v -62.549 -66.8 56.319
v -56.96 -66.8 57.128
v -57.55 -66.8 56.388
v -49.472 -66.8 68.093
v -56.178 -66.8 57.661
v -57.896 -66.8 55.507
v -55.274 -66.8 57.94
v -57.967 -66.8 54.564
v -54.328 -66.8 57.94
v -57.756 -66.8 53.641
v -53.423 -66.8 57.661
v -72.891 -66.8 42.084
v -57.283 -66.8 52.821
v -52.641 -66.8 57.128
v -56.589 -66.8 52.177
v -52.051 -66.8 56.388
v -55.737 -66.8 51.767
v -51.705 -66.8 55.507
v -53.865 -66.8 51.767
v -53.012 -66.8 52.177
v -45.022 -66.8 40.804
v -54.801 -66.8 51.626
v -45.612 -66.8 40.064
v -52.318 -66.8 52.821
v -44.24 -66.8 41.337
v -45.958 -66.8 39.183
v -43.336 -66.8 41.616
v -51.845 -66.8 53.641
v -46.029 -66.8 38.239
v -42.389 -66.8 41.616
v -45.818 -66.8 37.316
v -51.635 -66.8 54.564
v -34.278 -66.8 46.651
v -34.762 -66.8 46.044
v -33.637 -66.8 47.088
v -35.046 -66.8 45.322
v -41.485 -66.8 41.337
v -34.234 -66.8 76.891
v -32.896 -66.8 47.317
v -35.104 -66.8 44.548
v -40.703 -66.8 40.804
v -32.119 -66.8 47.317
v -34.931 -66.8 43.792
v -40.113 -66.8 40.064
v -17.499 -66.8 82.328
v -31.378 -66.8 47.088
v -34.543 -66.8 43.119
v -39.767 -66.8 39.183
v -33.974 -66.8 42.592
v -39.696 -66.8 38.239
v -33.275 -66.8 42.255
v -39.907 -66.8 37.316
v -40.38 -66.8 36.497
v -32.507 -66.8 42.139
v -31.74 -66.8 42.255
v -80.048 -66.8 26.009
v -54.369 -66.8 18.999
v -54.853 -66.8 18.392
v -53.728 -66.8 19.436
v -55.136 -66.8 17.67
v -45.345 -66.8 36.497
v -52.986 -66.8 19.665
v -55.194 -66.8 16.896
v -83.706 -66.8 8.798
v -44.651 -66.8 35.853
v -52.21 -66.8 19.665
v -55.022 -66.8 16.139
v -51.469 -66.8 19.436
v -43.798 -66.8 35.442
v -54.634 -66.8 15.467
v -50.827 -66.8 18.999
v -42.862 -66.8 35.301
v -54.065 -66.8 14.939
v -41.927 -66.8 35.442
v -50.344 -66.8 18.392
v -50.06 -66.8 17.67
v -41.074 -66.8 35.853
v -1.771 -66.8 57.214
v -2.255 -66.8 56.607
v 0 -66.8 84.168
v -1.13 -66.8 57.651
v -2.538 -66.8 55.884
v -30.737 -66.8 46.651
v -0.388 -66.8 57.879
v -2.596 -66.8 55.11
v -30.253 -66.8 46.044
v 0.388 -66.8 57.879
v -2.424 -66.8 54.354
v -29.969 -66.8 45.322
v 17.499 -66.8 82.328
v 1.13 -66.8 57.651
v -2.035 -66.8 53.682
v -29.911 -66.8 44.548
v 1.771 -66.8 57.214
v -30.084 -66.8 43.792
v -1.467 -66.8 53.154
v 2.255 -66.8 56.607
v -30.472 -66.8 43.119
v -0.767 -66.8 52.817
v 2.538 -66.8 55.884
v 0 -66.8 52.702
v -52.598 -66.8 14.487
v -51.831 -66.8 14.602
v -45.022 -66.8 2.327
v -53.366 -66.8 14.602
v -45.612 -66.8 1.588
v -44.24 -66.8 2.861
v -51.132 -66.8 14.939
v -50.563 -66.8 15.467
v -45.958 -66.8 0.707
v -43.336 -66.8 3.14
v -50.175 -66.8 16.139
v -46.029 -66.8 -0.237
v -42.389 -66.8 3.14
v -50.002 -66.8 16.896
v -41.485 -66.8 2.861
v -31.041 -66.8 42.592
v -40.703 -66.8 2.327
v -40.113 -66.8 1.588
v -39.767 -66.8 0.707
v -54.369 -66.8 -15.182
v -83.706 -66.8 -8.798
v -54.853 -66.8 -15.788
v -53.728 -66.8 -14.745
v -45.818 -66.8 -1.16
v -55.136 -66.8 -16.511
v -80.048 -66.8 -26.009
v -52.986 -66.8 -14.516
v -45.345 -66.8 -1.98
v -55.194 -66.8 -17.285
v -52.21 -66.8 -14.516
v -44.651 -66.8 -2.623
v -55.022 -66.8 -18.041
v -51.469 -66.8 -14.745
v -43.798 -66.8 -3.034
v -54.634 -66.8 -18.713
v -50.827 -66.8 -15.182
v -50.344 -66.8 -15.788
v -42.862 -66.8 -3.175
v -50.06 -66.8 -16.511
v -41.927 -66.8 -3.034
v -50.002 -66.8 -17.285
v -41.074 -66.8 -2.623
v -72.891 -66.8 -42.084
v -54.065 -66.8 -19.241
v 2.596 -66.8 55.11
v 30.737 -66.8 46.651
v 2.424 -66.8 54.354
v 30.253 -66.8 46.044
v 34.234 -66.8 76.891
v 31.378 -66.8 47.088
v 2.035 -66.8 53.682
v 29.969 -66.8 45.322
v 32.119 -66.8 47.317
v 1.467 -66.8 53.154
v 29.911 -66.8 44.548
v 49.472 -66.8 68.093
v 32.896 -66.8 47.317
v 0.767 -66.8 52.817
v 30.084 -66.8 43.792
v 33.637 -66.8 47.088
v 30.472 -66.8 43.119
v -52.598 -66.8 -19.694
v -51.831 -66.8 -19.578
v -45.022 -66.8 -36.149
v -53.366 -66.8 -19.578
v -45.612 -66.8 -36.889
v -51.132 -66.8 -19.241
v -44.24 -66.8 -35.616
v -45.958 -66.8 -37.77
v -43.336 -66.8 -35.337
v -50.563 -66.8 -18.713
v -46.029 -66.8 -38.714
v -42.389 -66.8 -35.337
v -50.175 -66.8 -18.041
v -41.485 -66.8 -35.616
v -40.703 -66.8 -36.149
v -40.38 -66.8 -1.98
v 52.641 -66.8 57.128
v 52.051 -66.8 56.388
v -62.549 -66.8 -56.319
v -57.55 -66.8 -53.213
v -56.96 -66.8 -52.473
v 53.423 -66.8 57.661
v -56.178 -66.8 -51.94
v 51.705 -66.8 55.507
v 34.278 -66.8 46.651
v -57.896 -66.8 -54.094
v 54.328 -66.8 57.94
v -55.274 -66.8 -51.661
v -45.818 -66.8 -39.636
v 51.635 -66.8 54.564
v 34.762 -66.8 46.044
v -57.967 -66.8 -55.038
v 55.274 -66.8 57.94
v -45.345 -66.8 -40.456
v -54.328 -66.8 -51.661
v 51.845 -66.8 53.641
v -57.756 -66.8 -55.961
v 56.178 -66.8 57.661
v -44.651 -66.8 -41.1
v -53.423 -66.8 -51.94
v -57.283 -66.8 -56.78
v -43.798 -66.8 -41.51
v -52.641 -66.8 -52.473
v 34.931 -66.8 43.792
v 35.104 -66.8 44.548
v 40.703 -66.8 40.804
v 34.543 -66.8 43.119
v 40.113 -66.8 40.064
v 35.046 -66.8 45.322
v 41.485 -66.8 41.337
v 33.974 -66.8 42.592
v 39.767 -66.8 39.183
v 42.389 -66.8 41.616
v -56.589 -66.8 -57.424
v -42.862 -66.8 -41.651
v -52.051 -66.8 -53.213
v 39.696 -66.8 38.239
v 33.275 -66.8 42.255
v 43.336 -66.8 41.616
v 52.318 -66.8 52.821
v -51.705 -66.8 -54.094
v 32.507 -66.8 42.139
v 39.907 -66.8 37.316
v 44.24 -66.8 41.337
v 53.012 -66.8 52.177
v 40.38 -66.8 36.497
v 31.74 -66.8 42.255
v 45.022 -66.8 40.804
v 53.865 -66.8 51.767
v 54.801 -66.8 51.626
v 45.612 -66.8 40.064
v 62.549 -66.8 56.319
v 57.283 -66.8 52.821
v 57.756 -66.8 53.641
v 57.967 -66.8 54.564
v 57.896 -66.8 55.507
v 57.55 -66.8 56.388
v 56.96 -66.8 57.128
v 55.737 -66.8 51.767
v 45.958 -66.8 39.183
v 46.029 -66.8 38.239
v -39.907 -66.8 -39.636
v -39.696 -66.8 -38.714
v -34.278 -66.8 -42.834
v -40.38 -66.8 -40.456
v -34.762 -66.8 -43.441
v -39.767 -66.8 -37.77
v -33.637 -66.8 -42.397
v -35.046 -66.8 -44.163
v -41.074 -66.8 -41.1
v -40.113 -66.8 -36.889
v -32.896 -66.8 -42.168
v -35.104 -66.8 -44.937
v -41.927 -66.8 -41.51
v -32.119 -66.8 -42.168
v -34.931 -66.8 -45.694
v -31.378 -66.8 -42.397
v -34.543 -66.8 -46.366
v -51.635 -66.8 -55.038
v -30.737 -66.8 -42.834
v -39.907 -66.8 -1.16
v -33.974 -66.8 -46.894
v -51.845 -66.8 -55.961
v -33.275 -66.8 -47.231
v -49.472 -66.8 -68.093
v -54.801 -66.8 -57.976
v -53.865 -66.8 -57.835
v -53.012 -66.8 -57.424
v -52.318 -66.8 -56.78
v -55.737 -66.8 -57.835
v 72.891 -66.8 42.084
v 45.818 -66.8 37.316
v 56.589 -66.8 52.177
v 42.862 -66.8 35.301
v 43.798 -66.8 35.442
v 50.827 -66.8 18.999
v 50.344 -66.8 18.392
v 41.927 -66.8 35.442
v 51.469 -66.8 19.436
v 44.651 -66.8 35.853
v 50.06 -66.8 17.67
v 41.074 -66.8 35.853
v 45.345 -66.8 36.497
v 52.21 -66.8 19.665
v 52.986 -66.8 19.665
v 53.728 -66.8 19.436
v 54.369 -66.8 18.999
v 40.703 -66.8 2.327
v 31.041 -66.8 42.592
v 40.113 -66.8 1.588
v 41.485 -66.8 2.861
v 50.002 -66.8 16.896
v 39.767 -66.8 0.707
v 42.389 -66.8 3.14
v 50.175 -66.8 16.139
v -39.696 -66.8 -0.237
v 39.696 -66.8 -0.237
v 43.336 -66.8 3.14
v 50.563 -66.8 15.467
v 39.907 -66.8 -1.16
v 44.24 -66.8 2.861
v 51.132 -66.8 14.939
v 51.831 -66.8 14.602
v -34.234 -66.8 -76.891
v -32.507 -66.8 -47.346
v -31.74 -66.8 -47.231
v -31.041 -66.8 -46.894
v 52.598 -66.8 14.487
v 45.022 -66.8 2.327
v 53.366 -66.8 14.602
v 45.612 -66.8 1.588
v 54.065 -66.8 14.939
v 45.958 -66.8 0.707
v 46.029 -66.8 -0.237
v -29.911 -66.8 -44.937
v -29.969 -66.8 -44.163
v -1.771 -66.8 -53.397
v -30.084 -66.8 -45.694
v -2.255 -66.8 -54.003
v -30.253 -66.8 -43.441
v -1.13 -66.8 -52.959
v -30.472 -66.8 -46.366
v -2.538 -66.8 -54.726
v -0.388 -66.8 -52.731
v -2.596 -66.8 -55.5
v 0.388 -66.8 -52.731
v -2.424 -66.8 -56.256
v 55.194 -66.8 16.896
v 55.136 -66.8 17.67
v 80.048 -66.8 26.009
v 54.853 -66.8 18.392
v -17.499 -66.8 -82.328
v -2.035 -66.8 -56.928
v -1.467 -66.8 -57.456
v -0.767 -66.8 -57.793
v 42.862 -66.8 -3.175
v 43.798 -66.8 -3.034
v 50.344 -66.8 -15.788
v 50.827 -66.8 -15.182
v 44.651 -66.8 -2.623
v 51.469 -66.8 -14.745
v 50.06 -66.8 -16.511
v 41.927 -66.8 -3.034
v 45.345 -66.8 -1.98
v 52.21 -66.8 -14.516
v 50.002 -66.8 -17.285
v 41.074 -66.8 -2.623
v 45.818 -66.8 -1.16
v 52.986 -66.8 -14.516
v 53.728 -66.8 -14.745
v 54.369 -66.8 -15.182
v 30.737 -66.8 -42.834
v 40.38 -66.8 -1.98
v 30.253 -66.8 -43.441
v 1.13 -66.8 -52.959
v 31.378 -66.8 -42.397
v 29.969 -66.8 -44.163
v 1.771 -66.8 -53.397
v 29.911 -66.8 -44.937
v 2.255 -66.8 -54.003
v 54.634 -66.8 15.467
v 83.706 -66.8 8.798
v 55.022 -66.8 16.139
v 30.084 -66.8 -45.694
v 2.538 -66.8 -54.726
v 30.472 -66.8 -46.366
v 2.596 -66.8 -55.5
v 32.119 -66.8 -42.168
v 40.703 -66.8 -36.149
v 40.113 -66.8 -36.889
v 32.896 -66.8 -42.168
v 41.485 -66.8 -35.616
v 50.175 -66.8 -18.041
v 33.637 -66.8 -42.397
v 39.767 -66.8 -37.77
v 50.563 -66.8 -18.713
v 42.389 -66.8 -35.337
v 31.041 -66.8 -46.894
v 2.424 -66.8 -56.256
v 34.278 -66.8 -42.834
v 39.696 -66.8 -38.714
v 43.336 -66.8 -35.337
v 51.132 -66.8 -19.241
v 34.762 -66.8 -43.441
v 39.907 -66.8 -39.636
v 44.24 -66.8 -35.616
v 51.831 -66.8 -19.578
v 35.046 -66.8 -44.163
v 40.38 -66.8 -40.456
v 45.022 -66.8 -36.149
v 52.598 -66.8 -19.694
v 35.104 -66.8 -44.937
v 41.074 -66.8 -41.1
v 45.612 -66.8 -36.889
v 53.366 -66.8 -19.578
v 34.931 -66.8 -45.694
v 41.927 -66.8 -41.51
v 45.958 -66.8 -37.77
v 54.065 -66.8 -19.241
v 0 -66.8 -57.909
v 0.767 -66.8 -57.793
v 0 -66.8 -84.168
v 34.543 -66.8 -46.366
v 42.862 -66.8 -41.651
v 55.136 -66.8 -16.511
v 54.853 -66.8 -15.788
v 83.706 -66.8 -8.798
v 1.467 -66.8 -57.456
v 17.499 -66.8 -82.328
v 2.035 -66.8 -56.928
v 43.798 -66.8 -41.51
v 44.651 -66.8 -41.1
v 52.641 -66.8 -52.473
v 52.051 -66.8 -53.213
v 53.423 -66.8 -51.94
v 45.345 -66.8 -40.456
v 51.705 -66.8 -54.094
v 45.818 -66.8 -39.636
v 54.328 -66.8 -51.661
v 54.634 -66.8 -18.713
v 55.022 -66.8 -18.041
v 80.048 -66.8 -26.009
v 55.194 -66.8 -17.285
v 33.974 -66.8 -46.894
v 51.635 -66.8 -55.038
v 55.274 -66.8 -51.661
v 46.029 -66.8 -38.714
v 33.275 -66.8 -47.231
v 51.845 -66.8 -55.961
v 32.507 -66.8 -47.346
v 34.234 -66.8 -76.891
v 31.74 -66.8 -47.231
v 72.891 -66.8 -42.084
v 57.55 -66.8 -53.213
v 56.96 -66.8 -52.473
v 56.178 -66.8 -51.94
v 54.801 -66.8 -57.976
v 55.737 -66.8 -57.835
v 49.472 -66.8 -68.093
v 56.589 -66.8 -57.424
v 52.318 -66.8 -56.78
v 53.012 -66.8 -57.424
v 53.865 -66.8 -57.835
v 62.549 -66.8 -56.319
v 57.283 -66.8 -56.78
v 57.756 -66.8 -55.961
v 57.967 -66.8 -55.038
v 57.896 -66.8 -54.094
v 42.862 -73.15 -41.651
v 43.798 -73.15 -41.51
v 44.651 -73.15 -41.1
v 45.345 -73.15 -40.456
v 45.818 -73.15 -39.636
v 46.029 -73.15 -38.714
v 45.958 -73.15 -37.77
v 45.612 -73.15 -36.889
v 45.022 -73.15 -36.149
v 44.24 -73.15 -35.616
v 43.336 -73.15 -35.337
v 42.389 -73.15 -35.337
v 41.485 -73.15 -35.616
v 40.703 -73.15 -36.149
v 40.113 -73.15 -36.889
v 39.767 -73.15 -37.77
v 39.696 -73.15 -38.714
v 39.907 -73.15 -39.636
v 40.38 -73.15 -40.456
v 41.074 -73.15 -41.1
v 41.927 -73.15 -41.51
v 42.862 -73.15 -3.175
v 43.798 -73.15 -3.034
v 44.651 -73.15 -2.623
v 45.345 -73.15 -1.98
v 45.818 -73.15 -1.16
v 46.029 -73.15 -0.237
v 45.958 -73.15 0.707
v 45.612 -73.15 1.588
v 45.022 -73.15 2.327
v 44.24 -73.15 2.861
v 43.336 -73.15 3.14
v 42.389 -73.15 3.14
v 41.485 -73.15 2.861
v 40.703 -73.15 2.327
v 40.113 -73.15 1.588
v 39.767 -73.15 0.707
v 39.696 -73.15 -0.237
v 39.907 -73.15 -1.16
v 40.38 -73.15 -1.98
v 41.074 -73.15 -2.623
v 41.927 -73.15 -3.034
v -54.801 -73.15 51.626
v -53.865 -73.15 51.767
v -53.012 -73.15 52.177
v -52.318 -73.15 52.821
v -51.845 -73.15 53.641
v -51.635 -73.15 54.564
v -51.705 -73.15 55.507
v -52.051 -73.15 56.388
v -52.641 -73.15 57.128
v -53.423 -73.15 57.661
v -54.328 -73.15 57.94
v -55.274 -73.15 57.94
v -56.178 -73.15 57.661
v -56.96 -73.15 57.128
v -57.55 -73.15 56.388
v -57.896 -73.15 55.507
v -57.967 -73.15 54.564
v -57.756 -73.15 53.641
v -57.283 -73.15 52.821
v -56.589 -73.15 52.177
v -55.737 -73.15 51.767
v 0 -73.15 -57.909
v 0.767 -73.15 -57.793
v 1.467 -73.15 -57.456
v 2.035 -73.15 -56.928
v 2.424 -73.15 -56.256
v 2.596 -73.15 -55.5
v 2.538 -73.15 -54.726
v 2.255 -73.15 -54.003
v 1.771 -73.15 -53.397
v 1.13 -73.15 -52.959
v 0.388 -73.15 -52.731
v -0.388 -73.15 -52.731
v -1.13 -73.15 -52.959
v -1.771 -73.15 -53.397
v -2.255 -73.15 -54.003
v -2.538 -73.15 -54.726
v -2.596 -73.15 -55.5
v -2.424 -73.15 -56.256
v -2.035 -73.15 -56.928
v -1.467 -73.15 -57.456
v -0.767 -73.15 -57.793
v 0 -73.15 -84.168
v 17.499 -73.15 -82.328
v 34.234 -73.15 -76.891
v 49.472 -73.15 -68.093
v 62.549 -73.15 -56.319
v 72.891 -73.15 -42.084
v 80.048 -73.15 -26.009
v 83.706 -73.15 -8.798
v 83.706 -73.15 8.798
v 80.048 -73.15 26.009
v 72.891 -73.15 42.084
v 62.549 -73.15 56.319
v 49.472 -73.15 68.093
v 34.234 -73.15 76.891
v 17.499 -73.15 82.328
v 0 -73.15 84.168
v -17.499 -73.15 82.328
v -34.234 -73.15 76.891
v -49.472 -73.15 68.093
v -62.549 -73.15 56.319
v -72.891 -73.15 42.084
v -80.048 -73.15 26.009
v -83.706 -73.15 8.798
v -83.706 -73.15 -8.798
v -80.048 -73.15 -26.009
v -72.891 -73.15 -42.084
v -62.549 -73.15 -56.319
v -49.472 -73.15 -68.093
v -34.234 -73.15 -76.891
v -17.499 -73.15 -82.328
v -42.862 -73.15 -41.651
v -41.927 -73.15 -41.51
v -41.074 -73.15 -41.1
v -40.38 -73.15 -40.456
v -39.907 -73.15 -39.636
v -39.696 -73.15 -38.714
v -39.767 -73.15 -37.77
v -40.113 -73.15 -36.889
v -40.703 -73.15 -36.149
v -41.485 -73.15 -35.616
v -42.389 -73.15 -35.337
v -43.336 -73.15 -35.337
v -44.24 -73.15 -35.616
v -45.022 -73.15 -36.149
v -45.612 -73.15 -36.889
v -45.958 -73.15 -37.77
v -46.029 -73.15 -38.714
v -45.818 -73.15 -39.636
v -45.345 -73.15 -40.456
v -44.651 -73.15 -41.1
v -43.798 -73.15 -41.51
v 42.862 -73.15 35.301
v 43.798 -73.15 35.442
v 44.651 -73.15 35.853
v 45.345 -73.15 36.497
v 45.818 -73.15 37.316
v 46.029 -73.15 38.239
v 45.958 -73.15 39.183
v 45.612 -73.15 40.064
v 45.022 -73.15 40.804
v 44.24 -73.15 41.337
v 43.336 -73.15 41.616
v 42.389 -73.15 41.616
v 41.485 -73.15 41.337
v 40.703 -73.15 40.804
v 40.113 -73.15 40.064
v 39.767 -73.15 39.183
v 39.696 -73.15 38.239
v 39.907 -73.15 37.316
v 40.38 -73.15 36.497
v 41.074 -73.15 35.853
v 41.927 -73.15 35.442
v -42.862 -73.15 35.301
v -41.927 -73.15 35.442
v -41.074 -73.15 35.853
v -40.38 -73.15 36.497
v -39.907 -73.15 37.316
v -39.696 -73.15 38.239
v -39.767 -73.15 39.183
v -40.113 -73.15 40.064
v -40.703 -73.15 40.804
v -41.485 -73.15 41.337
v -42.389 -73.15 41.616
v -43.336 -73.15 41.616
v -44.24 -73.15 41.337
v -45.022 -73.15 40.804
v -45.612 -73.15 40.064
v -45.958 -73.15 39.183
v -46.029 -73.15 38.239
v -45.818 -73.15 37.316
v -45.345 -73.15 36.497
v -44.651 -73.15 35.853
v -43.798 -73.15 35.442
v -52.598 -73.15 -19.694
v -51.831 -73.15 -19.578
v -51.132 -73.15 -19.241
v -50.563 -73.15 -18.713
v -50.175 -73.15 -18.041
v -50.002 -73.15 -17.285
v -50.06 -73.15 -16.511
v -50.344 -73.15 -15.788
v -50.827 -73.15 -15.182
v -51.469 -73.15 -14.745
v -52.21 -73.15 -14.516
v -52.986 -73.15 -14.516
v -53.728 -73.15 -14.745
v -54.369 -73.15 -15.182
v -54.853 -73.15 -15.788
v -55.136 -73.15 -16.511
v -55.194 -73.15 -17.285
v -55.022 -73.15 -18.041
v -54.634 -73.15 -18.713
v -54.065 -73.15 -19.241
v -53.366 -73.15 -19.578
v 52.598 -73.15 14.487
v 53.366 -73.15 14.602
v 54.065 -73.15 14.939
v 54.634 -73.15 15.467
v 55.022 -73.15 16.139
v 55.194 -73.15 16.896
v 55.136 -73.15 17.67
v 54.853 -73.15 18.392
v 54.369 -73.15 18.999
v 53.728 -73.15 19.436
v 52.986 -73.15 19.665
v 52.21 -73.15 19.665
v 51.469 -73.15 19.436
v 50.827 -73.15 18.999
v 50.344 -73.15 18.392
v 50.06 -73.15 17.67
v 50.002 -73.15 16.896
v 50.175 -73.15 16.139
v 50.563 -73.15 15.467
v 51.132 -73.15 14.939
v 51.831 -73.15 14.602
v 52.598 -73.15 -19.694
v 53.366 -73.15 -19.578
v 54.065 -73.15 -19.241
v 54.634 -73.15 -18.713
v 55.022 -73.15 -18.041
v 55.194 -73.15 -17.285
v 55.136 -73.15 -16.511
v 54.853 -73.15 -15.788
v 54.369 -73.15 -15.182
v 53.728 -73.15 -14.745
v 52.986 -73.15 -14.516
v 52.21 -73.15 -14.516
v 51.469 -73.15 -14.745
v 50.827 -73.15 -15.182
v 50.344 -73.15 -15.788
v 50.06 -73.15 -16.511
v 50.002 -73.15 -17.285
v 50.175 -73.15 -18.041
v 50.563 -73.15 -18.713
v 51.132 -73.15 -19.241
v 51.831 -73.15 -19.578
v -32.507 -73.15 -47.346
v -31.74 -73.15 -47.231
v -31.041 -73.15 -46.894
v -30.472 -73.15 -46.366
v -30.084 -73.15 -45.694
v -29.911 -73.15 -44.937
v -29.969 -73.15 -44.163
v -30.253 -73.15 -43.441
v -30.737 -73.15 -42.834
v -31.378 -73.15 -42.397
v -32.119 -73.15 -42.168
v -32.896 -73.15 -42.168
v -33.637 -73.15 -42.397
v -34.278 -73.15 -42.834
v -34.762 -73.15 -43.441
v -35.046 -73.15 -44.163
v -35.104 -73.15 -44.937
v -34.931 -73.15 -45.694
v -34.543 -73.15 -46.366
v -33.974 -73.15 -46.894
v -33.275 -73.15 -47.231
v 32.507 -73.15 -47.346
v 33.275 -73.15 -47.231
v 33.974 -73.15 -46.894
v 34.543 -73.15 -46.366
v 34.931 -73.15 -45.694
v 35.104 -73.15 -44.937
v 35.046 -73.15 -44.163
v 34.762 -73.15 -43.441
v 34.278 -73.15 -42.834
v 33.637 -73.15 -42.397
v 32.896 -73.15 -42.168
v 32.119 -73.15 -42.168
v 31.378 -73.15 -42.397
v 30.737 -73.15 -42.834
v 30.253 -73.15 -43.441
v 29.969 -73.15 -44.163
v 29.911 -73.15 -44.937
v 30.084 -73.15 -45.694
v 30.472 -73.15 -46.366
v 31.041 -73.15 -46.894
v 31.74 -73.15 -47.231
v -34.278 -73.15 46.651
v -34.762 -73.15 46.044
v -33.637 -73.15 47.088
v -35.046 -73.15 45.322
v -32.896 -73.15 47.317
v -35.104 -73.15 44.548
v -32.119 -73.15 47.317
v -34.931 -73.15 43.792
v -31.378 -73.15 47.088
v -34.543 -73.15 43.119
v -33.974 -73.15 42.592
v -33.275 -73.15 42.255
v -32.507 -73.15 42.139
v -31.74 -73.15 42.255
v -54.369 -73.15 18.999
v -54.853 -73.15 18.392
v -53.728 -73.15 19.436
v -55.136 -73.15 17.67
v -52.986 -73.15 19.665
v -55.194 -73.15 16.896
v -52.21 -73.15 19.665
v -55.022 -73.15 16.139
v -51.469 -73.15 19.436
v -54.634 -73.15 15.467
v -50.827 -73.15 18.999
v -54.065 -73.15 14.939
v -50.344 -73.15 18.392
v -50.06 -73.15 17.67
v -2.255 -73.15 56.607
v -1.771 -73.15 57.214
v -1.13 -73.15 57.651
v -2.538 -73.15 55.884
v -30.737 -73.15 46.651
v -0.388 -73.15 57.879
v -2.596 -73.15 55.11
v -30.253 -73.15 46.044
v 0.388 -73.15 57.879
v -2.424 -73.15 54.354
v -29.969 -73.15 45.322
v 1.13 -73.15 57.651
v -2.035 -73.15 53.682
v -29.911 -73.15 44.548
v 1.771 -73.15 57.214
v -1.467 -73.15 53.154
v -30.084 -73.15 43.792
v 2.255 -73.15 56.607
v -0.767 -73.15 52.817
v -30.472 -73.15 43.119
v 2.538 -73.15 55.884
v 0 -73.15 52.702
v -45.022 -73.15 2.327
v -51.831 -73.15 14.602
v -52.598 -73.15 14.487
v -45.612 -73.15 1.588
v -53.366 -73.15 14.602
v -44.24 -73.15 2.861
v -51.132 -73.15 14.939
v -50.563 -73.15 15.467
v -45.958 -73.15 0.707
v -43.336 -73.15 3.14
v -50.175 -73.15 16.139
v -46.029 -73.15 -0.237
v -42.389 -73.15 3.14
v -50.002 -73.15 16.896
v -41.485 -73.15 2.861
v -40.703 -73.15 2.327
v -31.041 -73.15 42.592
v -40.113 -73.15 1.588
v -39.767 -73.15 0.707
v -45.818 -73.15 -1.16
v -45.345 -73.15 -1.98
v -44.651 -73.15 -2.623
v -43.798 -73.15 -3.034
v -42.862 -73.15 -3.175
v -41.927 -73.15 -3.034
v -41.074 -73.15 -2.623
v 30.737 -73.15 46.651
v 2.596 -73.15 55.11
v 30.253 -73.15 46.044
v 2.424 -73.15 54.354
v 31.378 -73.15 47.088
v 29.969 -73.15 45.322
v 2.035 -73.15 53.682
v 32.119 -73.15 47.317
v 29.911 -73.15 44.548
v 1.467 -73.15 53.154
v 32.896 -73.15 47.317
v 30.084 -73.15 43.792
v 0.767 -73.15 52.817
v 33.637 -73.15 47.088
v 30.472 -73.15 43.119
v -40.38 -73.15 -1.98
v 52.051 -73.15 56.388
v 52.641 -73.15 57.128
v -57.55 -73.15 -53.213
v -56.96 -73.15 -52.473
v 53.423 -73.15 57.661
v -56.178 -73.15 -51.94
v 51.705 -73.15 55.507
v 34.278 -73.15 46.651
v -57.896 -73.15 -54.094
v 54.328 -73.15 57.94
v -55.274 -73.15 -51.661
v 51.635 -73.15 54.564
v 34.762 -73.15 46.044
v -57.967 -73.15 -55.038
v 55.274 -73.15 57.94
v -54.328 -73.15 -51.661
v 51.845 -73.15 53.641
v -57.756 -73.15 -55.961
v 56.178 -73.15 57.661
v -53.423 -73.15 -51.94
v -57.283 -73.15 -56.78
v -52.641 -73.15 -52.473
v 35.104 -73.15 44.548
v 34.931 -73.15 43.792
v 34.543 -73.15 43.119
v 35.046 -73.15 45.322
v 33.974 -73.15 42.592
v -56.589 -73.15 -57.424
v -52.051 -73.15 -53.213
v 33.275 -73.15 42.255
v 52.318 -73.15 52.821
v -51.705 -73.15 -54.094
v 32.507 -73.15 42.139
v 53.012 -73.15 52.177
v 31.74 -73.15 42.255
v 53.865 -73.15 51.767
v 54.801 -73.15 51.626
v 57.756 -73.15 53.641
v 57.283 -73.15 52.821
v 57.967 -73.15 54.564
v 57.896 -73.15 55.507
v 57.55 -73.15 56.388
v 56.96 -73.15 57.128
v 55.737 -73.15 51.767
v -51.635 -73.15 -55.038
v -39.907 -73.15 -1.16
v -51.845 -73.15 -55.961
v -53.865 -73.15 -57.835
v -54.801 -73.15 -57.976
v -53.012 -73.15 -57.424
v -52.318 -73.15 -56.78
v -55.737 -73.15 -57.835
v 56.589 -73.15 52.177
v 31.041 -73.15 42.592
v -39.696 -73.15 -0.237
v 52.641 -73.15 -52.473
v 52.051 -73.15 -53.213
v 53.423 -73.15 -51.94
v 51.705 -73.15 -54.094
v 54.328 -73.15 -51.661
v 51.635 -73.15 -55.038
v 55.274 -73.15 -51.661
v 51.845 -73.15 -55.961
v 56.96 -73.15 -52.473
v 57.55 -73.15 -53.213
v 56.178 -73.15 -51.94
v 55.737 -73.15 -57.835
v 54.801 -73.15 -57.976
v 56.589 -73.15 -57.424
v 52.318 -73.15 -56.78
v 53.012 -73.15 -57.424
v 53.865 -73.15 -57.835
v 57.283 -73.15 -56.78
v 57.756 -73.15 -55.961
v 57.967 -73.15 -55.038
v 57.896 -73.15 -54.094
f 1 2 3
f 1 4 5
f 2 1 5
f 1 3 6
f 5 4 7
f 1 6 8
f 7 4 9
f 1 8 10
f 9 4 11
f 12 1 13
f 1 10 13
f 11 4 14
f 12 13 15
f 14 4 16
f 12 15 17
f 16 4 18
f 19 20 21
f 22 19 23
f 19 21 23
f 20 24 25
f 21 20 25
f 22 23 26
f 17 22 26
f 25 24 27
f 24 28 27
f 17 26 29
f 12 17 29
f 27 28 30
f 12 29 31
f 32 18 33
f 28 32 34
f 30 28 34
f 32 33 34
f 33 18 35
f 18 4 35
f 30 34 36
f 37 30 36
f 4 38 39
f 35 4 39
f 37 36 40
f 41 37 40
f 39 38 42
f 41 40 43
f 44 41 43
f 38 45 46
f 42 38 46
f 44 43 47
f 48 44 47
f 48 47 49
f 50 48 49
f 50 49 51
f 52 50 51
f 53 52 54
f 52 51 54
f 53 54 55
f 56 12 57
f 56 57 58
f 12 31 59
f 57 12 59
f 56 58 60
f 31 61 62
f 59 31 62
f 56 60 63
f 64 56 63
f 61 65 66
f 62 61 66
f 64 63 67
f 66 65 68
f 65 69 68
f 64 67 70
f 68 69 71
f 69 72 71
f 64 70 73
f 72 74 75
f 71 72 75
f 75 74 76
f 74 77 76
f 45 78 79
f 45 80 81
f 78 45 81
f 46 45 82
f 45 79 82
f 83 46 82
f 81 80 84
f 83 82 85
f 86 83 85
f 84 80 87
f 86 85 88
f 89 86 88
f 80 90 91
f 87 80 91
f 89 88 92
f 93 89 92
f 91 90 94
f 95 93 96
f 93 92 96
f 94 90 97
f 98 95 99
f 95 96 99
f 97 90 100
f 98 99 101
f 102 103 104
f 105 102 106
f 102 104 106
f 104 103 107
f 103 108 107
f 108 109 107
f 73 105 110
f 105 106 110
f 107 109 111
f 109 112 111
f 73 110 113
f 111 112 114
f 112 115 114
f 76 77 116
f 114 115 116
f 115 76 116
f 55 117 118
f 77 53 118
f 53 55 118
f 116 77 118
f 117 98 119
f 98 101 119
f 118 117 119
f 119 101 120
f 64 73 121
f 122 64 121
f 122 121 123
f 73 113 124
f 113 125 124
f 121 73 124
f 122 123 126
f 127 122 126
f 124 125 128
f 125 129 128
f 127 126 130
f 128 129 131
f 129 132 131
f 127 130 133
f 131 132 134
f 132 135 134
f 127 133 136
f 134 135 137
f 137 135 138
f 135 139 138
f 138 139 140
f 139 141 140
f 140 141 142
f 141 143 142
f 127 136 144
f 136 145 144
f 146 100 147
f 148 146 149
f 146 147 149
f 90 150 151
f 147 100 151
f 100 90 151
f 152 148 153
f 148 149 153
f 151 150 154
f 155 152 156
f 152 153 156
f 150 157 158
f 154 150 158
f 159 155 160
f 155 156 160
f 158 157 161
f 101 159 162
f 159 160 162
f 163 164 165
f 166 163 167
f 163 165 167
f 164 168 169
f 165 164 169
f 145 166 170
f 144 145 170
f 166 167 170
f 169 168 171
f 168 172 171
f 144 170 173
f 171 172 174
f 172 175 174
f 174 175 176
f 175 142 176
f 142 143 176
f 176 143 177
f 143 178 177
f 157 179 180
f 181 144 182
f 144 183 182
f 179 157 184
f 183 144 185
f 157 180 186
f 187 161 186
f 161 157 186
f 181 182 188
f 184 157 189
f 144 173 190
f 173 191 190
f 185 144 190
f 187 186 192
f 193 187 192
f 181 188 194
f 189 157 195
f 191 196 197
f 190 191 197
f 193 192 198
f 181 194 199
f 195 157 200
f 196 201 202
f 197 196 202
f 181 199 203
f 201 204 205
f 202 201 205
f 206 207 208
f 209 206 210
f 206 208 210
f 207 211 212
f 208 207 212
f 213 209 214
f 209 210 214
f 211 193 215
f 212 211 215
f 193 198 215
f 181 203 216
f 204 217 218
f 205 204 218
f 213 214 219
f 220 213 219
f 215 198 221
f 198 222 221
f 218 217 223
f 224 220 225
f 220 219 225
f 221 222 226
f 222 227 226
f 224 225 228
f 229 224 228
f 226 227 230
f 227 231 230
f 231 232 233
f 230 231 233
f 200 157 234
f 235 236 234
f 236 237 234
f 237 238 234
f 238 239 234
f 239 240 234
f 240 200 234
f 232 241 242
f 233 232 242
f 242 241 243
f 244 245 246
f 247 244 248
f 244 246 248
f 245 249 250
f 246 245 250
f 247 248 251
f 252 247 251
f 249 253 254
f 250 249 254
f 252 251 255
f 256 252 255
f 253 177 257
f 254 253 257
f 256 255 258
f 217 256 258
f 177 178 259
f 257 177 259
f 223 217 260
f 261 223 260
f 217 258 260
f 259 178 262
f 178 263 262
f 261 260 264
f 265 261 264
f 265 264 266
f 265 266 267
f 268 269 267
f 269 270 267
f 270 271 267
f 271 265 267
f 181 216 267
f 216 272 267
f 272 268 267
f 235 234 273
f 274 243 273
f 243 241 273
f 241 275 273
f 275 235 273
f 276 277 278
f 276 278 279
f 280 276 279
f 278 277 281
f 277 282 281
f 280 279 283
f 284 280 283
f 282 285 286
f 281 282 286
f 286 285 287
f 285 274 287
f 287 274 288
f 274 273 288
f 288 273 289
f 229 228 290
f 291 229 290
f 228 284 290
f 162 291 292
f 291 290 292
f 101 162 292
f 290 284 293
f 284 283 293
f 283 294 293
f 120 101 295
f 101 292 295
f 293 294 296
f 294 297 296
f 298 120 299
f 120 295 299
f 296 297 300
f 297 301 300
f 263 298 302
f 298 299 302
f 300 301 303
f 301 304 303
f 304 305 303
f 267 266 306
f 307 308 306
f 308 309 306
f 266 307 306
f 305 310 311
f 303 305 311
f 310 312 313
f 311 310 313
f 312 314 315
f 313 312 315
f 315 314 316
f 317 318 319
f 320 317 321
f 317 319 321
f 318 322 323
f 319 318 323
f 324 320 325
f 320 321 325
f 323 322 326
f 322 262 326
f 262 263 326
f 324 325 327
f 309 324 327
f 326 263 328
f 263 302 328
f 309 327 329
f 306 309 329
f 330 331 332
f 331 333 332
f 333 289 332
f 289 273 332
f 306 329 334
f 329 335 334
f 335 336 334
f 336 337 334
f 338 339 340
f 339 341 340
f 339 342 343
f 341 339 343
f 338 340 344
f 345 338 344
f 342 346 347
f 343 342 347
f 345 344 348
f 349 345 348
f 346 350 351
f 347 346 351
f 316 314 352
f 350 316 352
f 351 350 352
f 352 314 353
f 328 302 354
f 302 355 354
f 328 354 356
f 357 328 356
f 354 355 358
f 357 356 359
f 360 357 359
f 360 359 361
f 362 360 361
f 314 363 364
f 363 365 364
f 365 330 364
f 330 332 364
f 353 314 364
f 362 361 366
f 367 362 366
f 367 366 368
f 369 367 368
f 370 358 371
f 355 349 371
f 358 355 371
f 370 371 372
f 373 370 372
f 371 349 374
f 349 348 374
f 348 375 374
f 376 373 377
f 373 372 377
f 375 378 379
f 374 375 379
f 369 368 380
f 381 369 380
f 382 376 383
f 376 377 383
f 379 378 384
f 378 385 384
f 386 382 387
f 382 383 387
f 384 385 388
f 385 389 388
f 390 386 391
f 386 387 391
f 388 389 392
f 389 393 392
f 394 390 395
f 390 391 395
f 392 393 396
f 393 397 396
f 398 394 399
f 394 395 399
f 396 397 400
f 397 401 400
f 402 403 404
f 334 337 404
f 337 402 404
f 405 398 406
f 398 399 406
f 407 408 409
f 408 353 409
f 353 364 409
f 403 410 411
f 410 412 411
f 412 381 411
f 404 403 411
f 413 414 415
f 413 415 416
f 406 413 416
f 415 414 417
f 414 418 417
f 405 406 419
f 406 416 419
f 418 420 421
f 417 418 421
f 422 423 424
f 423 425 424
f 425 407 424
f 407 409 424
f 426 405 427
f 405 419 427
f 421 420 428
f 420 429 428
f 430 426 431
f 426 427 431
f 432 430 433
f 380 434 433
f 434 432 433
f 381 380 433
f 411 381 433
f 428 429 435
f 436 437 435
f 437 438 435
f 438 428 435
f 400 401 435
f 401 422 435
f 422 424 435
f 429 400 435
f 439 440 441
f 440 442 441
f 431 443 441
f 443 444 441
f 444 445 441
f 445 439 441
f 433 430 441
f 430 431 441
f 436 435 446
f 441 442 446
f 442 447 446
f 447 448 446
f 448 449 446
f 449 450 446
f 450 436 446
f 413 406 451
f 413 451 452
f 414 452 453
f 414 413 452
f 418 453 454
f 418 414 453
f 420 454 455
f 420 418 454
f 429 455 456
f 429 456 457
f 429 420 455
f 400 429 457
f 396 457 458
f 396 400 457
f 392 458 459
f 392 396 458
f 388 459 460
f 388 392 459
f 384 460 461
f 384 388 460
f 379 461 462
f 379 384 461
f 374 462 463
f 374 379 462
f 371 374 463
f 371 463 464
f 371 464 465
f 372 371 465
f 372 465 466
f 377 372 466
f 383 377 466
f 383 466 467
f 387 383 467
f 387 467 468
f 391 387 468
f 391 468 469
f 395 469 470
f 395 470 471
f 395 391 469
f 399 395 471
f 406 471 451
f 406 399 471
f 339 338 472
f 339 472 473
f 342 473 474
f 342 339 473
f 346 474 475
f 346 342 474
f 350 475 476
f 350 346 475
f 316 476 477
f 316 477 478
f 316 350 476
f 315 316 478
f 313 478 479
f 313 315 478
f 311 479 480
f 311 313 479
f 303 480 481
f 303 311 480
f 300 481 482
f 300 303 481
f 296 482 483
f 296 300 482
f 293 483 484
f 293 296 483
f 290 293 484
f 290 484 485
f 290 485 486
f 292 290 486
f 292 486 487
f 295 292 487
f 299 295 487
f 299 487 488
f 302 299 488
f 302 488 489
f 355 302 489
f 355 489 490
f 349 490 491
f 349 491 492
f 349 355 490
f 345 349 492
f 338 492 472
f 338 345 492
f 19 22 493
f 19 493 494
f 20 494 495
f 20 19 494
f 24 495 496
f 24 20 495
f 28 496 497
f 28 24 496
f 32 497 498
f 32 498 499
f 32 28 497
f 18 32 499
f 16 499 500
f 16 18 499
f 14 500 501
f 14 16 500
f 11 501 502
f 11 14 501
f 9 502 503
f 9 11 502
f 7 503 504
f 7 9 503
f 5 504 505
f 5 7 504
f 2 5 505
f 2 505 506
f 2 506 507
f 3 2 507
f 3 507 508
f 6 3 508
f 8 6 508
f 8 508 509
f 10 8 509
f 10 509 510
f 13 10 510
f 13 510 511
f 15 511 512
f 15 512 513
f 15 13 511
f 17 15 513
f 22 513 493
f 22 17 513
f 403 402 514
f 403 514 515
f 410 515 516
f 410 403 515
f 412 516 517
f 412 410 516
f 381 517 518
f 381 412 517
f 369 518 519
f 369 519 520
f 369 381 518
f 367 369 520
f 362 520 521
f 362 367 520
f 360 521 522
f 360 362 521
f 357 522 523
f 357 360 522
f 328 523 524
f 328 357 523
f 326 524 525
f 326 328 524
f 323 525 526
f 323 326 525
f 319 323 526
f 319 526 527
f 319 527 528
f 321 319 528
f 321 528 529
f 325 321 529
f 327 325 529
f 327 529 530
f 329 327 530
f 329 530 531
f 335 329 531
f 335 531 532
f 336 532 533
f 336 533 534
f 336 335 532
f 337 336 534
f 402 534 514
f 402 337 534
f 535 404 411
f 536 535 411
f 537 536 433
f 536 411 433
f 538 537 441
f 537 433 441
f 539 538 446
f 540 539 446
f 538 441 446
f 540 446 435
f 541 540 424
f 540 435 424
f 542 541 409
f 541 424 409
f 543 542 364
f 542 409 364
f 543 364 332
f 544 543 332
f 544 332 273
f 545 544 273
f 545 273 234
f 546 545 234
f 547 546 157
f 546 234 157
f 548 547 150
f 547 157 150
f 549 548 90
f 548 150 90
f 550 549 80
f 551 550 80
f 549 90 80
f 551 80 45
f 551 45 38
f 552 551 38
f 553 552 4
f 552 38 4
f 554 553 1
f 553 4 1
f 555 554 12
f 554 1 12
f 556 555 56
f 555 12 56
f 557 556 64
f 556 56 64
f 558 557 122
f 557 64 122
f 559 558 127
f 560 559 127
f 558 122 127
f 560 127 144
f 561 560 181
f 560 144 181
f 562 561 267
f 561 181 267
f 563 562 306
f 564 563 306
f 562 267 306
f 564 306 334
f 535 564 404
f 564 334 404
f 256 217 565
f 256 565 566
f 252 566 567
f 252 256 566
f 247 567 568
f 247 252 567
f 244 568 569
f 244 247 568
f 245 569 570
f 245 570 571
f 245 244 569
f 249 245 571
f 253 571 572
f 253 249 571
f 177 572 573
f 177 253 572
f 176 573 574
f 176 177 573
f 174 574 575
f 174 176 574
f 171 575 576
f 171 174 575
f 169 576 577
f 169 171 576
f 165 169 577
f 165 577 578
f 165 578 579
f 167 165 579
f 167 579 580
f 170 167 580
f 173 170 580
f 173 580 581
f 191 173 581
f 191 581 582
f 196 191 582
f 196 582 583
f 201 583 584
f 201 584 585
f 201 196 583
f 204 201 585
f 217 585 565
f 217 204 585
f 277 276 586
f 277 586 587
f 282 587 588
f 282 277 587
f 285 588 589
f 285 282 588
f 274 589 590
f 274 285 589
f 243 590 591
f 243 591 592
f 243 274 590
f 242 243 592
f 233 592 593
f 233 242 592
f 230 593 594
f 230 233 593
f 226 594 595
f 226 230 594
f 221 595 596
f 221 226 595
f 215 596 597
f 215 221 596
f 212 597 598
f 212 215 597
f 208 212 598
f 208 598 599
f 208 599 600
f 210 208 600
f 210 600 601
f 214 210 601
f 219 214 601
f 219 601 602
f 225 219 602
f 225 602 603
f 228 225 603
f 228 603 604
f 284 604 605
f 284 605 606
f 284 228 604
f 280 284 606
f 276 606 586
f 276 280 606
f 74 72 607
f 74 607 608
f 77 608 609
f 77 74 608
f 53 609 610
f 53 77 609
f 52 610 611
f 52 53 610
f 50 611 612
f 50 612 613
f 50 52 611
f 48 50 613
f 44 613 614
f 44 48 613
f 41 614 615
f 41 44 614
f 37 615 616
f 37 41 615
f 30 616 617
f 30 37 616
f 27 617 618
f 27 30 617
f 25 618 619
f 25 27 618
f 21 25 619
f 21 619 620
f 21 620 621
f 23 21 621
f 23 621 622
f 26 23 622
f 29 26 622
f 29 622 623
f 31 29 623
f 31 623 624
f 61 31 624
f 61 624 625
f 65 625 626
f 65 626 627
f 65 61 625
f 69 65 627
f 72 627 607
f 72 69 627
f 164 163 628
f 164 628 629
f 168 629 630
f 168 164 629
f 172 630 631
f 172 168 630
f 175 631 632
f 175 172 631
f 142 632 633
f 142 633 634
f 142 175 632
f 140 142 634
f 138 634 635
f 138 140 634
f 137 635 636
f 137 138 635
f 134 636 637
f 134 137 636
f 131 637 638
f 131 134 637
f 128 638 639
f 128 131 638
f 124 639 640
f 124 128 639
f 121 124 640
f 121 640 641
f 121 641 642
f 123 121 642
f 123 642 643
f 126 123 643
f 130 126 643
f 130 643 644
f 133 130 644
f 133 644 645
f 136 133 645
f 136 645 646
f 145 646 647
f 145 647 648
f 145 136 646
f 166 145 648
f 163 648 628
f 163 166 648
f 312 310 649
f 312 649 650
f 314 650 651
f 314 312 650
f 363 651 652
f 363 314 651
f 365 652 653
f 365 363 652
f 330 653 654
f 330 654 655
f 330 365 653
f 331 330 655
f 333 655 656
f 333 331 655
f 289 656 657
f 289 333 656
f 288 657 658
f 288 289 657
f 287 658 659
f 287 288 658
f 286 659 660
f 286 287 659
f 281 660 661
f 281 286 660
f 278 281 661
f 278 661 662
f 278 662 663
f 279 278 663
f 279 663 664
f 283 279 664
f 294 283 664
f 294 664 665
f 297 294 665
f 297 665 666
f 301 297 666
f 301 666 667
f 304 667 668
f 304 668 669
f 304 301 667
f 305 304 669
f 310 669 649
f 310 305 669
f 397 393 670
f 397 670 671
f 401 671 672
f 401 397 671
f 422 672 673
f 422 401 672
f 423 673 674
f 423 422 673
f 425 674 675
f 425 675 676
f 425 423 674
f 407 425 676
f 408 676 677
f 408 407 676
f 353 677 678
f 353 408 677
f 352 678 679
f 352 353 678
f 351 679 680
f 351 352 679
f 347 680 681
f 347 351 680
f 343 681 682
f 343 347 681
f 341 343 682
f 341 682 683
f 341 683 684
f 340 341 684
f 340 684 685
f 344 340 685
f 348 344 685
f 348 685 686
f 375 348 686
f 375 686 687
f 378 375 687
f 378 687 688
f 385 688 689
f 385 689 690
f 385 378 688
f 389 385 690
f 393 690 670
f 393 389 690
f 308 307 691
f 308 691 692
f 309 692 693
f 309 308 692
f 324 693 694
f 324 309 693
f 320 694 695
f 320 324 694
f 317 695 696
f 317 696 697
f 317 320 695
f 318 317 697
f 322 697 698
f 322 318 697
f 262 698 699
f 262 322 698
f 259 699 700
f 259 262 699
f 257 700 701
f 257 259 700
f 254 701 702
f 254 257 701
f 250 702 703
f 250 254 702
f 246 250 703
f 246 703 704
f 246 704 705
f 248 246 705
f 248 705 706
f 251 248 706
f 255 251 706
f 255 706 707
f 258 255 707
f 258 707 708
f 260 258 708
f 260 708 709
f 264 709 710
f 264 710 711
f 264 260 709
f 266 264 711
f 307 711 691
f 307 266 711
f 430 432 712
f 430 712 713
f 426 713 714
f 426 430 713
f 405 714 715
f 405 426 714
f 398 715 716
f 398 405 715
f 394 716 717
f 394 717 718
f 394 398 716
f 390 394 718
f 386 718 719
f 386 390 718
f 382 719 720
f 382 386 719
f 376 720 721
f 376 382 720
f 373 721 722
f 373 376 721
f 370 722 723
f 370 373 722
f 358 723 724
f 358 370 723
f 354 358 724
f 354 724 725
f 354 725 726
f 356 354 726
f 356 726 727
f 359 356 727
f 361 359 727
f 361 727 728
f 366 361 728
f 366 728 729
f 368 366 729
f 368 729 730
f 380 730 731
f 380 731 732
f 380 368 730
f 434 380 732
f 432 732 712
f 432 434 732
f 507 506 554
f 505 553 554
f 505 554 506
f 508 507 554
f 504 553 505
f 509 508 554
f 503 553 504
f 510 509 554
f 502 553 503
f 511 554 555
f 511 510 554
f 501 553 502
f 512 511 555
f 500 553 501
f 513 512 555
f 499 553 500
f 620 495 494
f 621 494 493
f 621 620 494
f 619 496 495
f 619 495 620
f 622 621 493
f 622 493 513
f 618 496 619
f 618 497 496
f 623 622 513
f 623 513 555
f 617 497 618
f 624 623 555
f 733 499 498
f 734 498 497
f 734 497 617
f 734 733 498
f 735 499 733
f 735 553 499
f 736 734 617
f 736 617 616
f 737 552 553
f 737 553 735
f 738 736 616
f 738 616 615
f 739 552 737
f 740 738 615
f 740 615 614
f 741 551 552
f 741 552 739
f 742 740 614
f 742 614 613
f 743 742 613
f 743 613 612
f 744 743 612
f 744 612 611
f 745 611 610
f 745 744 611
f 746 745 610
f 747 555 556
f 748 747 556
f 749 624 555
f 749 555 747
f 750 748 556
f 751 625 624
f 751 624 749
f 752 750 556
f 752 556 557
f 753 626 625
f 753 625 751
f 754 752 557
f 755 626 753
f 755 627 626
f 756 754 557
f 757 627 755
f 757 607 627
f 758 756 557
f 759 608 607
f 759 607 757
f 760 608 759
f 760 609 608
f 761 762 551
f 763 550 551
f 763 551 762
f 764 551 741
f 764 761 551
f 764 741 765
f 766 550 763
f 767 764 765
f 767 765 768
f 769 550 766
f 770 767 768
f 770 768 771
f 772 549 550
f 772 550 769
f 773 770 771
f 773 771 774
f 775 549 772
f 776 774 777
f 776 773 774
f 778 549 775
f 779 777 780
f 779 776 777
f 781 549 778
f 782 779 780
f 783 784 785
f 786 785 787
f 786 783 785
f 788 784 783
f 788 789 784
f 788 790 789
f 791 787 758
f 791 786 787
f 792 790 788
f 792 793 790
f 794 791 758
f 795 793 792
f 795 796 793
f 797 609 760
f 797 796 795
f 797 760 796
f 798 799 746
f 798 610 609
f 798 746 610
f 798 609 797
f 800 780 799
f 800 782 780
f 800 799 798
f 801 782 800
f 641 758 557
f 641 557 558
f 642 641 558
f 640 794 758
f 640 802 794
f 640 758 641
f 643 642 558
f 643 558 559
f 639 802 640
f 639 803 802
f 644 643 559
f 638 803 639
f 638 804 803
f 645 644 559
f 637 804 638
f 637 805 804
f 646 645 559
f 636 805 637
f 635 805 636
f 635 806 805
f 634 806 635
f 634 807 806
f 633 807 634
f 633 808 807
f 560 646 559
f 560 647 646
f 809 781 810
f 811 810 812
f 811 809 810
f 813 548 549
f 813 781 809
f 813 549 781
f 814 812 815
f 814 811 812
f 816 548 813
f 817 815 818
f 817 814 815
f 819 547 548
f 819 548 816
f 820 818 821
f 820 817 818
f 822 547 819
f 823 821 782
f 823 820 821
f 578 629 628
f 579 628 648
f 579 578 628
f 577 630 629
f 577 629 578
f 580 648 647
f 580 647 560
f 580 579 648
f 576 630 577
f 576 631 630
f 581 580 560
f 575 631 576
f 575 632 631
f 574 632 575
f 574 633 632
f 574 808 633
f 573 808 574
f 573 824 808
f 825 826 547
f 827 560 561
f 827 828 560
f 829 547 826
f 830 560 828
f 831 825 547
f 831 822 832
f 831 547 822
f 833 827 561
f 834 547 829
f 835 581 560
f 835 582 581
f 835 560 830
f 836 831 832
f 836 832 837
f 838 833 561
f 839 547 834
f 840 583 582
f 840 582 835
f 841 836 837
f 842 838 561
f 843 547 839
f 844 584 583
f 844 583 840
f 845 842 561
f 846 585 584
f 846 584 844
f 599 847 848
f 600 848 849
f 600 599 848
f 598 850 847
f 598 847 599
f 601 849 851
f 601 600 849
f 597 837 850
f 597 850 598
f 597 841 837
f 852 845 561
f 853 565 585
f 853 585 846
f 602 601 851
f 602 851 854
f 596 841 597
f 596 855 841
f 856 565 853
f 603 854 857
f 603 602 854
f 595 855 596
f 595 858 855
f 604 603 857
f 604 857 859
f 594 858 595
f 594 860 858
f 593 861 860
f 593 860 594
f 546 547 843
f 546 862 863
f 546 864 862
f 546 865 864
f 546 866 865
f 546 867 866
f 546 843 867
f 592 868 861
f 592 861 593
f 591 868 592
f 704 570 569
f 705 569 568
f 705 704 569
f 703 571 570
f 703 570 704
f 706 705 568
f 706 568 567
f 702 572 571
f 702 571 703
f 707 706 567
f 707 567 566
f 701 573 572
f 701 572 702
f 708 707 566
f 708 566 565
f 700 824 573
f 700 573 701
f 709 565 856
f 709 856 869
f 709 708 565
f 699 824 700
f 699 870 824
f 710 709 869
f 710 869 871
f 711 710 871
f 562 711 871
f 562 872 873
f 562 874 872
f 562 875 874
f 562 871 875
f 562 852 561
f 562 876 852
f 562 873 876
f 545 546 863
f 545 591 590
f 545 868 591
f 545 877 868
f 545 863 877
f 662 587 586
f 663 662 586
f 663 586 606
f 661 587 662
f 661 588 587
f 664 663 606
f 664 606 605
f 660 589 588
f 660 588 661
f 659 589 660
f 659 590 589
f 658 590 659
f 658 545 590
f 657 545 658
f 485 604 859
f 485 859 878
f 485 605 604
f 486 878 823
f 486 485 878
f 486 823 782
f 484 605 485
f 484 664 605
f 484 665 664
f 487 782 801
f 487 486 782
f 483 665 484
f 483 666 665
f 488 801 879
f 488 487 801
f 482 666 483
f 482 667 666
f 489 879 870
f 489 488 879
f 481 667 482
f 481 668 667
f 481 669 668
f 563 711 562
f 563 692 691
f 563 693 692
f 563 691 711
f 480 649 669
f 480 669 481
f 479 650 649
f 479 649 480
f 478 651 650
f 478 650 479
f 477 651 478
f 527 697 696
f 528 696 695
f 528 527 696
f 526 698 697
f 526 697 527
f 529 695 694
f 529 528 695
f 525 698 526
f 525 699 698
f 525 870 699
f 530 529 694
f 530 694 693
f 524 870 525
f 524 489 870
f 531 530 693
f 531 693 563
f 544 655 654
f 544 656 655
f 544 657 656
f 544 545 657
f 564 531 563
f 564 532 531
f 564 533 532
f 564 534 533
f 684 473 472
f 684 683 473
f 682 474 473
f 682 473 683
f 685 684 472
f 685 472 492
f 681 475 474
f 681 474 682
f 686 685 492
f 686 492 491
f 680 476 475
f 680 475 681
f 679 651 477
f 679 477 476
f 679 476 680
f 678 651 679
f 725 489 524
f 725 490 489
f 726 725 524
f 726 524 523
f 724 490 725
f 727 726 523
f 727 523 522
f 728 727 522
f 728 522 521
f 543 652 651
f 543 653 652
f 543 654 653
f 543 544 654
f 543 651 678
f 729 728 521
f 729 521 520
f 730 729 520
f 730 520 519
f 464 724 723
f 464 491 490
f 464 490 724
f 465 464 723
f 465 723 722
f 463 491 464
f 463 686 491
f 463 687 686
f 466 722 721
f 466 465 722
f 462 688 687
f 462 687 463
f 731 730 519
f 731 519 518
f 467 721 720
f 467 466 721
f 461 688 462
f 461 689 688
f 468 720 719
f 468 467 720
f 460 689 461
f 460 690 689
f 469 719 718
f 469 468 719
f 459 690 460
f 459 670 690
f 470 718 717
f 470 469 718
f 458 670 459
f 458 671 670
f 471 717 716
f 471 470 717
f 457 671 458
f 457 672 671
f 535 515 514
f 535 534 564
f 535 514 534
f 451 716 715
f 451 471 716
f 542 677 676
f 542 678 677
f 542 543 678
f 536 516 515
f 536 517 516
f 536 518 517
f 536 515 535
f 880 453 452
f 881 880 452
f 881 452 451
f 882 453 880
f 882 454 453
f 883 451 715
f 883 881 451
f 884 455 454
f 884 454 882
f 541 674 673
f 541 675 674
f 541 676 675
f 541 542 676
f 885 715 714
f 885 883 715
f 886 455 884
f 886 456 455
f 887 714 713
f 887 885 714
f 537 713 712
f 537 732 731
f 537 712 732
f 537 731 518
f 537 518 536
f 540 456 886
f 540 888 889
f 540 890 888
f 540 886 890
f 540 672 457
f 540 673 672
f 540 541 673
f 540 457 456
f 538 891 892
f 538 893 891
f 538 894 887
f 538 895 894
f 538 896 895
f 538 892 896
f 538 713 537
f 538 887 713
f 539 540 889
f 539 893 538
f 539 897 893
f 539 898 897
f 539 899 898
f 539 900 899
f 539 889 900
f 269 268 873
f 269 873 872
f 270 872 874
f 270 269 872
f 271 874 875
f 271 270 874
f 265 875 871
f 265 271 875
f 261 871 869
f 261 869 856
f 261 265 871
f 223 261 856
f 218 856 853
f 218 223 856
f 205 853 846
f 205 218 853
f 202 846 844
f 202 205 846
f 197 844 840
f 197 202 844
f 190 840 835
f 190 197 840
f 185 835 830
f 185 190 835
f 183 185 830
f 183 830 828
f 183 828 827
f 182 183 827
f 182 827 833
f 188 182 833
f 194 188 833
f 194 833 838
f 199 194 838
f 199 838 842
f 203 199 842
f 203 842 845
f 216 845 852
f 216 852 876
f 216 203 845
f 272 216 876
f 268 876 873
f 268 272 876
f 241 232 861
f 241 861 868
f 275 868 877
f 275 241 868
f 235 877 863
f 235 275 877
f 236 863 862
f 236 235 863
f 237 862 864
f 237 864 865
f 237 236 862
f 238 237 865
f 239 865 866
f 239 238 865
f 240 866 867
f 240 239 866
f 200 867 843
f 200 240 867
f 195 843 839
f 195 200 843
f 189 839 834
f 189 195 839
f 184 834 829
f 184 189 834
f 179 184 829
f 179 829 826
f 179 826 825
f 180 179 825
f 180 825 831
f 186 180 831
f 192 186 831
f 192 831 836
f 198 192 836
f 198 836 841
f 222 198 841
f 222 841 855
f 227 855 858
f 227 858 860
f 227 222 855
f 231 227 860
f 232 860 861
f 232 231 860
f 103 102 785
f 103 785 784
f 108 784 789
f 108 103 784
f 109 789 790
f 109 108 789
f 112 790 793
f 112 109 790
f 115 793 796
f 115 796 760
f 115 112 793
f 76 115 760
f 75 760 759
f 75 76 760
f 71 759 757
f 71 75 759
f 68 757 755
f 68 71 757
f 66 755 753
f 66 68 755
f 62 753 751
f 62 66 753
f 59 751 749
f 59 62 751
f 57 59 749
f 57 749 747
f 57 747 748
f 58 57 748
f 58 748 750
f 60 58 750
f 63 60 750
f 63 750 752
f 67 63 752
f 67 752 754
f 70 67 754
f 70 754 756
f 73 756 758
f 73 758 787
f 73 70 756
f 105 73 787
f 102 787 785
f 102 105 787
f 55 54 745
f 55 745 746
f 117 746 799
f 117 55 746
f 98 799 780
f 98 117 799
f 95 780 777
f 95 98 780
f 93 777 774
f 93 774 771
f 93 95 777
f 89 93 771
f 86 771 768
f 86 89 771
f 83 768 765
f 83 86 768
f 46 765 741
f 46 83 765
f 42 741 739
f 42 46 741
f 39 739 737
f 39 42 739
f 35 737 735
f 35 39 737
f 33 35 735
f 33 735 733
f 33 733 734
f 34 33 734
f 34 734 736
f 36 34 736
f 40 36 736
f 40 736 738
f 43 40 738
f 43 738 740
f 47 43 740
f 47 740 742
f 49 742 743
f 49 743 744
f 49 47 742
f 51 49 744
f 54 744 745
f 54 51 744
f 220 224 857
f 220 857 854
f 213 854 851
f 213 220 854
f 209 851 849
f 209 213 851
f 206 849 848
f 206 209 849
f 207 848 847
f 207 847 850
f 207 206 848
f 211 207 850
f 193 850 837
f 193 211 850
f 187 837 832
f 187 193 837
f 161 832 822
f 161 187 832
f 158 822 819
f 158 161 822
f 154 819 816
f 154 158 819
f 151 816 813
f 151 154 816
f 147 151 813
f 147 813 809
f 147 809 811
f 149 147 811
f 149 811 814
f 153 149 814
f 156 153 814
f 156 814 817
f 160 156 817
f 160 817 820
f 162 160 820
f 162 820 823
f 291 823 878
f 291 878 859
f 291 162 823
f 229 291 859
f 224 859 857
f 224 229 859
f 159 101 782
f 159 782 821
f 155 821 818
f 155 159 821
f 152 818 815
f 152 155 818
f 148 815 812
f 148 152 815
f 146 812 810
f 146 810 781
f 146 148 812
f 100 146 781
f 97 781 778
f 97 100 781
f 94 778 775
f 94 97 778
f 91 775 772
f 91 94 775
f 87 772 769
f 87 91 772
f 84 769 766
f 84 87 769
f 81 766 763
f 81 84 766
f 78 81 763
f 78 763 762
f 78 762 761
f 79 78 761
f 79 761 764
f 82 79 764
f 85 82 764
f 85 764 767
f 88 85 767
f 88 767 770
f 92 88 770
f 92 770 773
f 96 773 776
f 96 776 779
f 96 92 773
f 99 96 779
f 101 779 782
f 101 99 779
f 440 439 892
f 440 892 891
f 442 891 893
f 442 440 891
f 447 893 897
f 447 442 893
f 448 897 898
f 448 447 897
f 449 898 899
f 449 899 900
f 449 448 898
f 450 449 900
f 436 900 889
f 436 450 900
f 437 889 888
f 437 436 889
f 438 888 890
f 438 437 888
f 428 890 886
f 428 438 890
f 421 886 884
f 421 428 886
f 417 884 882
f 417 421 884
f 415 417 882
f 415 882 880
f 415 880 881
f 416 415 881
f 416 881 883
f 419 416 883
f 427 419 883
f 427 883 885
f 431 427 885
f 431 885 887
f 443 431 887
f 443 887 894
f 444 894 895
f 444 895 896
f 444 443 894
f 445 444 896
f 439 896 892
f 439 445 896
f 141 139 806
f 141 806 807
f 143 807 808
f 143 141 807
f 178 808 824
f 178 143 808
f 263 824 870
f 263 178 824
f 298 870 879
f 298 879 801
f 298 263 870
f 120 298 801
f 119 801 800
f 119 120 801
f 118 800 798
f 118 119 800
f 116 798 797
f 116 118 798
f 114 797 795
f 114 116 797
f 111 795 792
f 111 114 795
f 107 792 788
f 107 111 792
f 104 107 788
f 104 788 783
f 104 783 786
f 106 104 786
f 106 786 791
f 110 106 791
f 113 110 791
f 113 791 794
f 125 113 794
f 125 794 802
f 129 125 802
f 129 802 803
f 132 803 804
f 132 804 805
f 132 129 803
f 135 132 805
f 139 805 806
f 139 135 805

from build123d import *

# Parameters (mm, degrees)
SKETCH1_R           = 84.1675
SKETCH1_R_2         = 3.175
SKETCH1_R_3         = 2.6035
BOSS_EXTRUDE1_DEPTH = 6.35


with BuildPart() as part:
    # Sketch1 → Boss-Extrude1 (new body)
    with BuildSketch(Plane.XZ.offset(66.8)):
        with Locations(Location((0, 0, 0), (0, 0, 270))):
            Circle(SKETCH1_R)
        with Locations(Location((54.800775542, 54.800775542, 0), (0, 0, 270))):
            Circle(SKETCH1_R_2, mode=Mode.SUBTRACT)
        with Locations(Location((54.800775542, -54.800775542, 0), (0, 0, 270))):
            Circle(SKETCH1_R_2, mode=Mode.SUBTRACT)
        with Locations(Location((-54.800775542, -54.800775542, 0), (0, 0, 270))):
            Circle(SKETCH1_R_2, mode=Mode.SUBTRACT)
        with Locations(Location((-54.800775542, 54.800775542, 0), (0, 0, 270))):
            Circle(SKETCH1_R_2, mode=Mode.SUBTRACT)
        with Locations(Location((-42.8625, -38.476238101, 0), (0, 0, 270))):
            Circle(SKETCH1_R_2, mode=Mode.SUBTRACT)
        with Locations(Location((-42.8625, 0, 0), (0, 0, 270))):
            Circle(SKETCH1_R_2, mode=Mode.SUBTRACT)
        with Locations(Location((-42.8625, 38.476238101, 0), (0, 0, 270))):
            Circle(SKETCH1_R_2, mode=Mode.SUBTRACT)
        with Locations(Location((42.8625, 38.476238101, 0), (0, 0, 270))):
            Circle(SKETCH1_R_2, mode=Mode.SUBTRACT)
        with Locations(Location((42.8625, 0, 0), (0, 0, 270))):
            Circle(SKETCH1_R_2, mode=Mode.SUBTRACT)
        with Locations(Location((42.8625, -38.476238101, 0), (0, 0, 270))):
            Circle(SKETCH1_R_2, mode=Mode.SUBTRACT)
        with Locations(Location((-52.598201949, -17.0901918, 0), (0, 0, 270))):
            Circle(SKETCH1_R_3, mode=Mode.SUBTRACT)
        with Locations(Location((-52.598201949, 17.0901918, 0), (0, 0, 270))):
            Circle(SKETCH1_R_3, mode=Mode.SUBTRACT)
        with Locations(Location((-32.507476552, 44.742703006, 0), (0, 0, 270))):
            Circle(SKETCH1_R_3, mode=Mode.SUBTRACT)
        with Locations(Location((0, 55.305022413, 0), (0, 0, 270))):
            Circle(SKETCH1_R_3, mode=Mode.SUBTRACT)
        with Locations(Location((32.507476552, 44.742703006, 0), (0, 0, 270))):
            Circle(SKETCH1_R_3, mode=Mode.SUBTRACT)
        with Locations(Location((52.598201949, 17.0901918, 0), (0, 0, 270))):
            Circle(SKETCH1_R_3, mode=Mode.SUBTRACT)
        with Locations(Location((52.598201949, -17.0901918, 0), (0, 0, 270))):
            Circle(SKETCH1_R_3, mode=Mode.SUBTRACT)
        with Locations(Location((32.507476552, -44.742703006, 0), (0, 0, 270))):
            Circle(SKETCH1_R_3, mode=Mode.SUBTRACT)
        with Locations(Location((0, -55.305022413, 0), (0, 0, 270))):
            Circle(SKETCH1_R_3, mode=Mode.SUBTRACT)
        with Locations(Location((-32.507476552, -44.742703006, 0), (0, 0, 270))):
            Circle(SKETCH1_R_3, mode=Mode.SUBTRACT)
    extrude(amount=BOSS_EXTRUDE1_DEPTH)


solid = part.part
